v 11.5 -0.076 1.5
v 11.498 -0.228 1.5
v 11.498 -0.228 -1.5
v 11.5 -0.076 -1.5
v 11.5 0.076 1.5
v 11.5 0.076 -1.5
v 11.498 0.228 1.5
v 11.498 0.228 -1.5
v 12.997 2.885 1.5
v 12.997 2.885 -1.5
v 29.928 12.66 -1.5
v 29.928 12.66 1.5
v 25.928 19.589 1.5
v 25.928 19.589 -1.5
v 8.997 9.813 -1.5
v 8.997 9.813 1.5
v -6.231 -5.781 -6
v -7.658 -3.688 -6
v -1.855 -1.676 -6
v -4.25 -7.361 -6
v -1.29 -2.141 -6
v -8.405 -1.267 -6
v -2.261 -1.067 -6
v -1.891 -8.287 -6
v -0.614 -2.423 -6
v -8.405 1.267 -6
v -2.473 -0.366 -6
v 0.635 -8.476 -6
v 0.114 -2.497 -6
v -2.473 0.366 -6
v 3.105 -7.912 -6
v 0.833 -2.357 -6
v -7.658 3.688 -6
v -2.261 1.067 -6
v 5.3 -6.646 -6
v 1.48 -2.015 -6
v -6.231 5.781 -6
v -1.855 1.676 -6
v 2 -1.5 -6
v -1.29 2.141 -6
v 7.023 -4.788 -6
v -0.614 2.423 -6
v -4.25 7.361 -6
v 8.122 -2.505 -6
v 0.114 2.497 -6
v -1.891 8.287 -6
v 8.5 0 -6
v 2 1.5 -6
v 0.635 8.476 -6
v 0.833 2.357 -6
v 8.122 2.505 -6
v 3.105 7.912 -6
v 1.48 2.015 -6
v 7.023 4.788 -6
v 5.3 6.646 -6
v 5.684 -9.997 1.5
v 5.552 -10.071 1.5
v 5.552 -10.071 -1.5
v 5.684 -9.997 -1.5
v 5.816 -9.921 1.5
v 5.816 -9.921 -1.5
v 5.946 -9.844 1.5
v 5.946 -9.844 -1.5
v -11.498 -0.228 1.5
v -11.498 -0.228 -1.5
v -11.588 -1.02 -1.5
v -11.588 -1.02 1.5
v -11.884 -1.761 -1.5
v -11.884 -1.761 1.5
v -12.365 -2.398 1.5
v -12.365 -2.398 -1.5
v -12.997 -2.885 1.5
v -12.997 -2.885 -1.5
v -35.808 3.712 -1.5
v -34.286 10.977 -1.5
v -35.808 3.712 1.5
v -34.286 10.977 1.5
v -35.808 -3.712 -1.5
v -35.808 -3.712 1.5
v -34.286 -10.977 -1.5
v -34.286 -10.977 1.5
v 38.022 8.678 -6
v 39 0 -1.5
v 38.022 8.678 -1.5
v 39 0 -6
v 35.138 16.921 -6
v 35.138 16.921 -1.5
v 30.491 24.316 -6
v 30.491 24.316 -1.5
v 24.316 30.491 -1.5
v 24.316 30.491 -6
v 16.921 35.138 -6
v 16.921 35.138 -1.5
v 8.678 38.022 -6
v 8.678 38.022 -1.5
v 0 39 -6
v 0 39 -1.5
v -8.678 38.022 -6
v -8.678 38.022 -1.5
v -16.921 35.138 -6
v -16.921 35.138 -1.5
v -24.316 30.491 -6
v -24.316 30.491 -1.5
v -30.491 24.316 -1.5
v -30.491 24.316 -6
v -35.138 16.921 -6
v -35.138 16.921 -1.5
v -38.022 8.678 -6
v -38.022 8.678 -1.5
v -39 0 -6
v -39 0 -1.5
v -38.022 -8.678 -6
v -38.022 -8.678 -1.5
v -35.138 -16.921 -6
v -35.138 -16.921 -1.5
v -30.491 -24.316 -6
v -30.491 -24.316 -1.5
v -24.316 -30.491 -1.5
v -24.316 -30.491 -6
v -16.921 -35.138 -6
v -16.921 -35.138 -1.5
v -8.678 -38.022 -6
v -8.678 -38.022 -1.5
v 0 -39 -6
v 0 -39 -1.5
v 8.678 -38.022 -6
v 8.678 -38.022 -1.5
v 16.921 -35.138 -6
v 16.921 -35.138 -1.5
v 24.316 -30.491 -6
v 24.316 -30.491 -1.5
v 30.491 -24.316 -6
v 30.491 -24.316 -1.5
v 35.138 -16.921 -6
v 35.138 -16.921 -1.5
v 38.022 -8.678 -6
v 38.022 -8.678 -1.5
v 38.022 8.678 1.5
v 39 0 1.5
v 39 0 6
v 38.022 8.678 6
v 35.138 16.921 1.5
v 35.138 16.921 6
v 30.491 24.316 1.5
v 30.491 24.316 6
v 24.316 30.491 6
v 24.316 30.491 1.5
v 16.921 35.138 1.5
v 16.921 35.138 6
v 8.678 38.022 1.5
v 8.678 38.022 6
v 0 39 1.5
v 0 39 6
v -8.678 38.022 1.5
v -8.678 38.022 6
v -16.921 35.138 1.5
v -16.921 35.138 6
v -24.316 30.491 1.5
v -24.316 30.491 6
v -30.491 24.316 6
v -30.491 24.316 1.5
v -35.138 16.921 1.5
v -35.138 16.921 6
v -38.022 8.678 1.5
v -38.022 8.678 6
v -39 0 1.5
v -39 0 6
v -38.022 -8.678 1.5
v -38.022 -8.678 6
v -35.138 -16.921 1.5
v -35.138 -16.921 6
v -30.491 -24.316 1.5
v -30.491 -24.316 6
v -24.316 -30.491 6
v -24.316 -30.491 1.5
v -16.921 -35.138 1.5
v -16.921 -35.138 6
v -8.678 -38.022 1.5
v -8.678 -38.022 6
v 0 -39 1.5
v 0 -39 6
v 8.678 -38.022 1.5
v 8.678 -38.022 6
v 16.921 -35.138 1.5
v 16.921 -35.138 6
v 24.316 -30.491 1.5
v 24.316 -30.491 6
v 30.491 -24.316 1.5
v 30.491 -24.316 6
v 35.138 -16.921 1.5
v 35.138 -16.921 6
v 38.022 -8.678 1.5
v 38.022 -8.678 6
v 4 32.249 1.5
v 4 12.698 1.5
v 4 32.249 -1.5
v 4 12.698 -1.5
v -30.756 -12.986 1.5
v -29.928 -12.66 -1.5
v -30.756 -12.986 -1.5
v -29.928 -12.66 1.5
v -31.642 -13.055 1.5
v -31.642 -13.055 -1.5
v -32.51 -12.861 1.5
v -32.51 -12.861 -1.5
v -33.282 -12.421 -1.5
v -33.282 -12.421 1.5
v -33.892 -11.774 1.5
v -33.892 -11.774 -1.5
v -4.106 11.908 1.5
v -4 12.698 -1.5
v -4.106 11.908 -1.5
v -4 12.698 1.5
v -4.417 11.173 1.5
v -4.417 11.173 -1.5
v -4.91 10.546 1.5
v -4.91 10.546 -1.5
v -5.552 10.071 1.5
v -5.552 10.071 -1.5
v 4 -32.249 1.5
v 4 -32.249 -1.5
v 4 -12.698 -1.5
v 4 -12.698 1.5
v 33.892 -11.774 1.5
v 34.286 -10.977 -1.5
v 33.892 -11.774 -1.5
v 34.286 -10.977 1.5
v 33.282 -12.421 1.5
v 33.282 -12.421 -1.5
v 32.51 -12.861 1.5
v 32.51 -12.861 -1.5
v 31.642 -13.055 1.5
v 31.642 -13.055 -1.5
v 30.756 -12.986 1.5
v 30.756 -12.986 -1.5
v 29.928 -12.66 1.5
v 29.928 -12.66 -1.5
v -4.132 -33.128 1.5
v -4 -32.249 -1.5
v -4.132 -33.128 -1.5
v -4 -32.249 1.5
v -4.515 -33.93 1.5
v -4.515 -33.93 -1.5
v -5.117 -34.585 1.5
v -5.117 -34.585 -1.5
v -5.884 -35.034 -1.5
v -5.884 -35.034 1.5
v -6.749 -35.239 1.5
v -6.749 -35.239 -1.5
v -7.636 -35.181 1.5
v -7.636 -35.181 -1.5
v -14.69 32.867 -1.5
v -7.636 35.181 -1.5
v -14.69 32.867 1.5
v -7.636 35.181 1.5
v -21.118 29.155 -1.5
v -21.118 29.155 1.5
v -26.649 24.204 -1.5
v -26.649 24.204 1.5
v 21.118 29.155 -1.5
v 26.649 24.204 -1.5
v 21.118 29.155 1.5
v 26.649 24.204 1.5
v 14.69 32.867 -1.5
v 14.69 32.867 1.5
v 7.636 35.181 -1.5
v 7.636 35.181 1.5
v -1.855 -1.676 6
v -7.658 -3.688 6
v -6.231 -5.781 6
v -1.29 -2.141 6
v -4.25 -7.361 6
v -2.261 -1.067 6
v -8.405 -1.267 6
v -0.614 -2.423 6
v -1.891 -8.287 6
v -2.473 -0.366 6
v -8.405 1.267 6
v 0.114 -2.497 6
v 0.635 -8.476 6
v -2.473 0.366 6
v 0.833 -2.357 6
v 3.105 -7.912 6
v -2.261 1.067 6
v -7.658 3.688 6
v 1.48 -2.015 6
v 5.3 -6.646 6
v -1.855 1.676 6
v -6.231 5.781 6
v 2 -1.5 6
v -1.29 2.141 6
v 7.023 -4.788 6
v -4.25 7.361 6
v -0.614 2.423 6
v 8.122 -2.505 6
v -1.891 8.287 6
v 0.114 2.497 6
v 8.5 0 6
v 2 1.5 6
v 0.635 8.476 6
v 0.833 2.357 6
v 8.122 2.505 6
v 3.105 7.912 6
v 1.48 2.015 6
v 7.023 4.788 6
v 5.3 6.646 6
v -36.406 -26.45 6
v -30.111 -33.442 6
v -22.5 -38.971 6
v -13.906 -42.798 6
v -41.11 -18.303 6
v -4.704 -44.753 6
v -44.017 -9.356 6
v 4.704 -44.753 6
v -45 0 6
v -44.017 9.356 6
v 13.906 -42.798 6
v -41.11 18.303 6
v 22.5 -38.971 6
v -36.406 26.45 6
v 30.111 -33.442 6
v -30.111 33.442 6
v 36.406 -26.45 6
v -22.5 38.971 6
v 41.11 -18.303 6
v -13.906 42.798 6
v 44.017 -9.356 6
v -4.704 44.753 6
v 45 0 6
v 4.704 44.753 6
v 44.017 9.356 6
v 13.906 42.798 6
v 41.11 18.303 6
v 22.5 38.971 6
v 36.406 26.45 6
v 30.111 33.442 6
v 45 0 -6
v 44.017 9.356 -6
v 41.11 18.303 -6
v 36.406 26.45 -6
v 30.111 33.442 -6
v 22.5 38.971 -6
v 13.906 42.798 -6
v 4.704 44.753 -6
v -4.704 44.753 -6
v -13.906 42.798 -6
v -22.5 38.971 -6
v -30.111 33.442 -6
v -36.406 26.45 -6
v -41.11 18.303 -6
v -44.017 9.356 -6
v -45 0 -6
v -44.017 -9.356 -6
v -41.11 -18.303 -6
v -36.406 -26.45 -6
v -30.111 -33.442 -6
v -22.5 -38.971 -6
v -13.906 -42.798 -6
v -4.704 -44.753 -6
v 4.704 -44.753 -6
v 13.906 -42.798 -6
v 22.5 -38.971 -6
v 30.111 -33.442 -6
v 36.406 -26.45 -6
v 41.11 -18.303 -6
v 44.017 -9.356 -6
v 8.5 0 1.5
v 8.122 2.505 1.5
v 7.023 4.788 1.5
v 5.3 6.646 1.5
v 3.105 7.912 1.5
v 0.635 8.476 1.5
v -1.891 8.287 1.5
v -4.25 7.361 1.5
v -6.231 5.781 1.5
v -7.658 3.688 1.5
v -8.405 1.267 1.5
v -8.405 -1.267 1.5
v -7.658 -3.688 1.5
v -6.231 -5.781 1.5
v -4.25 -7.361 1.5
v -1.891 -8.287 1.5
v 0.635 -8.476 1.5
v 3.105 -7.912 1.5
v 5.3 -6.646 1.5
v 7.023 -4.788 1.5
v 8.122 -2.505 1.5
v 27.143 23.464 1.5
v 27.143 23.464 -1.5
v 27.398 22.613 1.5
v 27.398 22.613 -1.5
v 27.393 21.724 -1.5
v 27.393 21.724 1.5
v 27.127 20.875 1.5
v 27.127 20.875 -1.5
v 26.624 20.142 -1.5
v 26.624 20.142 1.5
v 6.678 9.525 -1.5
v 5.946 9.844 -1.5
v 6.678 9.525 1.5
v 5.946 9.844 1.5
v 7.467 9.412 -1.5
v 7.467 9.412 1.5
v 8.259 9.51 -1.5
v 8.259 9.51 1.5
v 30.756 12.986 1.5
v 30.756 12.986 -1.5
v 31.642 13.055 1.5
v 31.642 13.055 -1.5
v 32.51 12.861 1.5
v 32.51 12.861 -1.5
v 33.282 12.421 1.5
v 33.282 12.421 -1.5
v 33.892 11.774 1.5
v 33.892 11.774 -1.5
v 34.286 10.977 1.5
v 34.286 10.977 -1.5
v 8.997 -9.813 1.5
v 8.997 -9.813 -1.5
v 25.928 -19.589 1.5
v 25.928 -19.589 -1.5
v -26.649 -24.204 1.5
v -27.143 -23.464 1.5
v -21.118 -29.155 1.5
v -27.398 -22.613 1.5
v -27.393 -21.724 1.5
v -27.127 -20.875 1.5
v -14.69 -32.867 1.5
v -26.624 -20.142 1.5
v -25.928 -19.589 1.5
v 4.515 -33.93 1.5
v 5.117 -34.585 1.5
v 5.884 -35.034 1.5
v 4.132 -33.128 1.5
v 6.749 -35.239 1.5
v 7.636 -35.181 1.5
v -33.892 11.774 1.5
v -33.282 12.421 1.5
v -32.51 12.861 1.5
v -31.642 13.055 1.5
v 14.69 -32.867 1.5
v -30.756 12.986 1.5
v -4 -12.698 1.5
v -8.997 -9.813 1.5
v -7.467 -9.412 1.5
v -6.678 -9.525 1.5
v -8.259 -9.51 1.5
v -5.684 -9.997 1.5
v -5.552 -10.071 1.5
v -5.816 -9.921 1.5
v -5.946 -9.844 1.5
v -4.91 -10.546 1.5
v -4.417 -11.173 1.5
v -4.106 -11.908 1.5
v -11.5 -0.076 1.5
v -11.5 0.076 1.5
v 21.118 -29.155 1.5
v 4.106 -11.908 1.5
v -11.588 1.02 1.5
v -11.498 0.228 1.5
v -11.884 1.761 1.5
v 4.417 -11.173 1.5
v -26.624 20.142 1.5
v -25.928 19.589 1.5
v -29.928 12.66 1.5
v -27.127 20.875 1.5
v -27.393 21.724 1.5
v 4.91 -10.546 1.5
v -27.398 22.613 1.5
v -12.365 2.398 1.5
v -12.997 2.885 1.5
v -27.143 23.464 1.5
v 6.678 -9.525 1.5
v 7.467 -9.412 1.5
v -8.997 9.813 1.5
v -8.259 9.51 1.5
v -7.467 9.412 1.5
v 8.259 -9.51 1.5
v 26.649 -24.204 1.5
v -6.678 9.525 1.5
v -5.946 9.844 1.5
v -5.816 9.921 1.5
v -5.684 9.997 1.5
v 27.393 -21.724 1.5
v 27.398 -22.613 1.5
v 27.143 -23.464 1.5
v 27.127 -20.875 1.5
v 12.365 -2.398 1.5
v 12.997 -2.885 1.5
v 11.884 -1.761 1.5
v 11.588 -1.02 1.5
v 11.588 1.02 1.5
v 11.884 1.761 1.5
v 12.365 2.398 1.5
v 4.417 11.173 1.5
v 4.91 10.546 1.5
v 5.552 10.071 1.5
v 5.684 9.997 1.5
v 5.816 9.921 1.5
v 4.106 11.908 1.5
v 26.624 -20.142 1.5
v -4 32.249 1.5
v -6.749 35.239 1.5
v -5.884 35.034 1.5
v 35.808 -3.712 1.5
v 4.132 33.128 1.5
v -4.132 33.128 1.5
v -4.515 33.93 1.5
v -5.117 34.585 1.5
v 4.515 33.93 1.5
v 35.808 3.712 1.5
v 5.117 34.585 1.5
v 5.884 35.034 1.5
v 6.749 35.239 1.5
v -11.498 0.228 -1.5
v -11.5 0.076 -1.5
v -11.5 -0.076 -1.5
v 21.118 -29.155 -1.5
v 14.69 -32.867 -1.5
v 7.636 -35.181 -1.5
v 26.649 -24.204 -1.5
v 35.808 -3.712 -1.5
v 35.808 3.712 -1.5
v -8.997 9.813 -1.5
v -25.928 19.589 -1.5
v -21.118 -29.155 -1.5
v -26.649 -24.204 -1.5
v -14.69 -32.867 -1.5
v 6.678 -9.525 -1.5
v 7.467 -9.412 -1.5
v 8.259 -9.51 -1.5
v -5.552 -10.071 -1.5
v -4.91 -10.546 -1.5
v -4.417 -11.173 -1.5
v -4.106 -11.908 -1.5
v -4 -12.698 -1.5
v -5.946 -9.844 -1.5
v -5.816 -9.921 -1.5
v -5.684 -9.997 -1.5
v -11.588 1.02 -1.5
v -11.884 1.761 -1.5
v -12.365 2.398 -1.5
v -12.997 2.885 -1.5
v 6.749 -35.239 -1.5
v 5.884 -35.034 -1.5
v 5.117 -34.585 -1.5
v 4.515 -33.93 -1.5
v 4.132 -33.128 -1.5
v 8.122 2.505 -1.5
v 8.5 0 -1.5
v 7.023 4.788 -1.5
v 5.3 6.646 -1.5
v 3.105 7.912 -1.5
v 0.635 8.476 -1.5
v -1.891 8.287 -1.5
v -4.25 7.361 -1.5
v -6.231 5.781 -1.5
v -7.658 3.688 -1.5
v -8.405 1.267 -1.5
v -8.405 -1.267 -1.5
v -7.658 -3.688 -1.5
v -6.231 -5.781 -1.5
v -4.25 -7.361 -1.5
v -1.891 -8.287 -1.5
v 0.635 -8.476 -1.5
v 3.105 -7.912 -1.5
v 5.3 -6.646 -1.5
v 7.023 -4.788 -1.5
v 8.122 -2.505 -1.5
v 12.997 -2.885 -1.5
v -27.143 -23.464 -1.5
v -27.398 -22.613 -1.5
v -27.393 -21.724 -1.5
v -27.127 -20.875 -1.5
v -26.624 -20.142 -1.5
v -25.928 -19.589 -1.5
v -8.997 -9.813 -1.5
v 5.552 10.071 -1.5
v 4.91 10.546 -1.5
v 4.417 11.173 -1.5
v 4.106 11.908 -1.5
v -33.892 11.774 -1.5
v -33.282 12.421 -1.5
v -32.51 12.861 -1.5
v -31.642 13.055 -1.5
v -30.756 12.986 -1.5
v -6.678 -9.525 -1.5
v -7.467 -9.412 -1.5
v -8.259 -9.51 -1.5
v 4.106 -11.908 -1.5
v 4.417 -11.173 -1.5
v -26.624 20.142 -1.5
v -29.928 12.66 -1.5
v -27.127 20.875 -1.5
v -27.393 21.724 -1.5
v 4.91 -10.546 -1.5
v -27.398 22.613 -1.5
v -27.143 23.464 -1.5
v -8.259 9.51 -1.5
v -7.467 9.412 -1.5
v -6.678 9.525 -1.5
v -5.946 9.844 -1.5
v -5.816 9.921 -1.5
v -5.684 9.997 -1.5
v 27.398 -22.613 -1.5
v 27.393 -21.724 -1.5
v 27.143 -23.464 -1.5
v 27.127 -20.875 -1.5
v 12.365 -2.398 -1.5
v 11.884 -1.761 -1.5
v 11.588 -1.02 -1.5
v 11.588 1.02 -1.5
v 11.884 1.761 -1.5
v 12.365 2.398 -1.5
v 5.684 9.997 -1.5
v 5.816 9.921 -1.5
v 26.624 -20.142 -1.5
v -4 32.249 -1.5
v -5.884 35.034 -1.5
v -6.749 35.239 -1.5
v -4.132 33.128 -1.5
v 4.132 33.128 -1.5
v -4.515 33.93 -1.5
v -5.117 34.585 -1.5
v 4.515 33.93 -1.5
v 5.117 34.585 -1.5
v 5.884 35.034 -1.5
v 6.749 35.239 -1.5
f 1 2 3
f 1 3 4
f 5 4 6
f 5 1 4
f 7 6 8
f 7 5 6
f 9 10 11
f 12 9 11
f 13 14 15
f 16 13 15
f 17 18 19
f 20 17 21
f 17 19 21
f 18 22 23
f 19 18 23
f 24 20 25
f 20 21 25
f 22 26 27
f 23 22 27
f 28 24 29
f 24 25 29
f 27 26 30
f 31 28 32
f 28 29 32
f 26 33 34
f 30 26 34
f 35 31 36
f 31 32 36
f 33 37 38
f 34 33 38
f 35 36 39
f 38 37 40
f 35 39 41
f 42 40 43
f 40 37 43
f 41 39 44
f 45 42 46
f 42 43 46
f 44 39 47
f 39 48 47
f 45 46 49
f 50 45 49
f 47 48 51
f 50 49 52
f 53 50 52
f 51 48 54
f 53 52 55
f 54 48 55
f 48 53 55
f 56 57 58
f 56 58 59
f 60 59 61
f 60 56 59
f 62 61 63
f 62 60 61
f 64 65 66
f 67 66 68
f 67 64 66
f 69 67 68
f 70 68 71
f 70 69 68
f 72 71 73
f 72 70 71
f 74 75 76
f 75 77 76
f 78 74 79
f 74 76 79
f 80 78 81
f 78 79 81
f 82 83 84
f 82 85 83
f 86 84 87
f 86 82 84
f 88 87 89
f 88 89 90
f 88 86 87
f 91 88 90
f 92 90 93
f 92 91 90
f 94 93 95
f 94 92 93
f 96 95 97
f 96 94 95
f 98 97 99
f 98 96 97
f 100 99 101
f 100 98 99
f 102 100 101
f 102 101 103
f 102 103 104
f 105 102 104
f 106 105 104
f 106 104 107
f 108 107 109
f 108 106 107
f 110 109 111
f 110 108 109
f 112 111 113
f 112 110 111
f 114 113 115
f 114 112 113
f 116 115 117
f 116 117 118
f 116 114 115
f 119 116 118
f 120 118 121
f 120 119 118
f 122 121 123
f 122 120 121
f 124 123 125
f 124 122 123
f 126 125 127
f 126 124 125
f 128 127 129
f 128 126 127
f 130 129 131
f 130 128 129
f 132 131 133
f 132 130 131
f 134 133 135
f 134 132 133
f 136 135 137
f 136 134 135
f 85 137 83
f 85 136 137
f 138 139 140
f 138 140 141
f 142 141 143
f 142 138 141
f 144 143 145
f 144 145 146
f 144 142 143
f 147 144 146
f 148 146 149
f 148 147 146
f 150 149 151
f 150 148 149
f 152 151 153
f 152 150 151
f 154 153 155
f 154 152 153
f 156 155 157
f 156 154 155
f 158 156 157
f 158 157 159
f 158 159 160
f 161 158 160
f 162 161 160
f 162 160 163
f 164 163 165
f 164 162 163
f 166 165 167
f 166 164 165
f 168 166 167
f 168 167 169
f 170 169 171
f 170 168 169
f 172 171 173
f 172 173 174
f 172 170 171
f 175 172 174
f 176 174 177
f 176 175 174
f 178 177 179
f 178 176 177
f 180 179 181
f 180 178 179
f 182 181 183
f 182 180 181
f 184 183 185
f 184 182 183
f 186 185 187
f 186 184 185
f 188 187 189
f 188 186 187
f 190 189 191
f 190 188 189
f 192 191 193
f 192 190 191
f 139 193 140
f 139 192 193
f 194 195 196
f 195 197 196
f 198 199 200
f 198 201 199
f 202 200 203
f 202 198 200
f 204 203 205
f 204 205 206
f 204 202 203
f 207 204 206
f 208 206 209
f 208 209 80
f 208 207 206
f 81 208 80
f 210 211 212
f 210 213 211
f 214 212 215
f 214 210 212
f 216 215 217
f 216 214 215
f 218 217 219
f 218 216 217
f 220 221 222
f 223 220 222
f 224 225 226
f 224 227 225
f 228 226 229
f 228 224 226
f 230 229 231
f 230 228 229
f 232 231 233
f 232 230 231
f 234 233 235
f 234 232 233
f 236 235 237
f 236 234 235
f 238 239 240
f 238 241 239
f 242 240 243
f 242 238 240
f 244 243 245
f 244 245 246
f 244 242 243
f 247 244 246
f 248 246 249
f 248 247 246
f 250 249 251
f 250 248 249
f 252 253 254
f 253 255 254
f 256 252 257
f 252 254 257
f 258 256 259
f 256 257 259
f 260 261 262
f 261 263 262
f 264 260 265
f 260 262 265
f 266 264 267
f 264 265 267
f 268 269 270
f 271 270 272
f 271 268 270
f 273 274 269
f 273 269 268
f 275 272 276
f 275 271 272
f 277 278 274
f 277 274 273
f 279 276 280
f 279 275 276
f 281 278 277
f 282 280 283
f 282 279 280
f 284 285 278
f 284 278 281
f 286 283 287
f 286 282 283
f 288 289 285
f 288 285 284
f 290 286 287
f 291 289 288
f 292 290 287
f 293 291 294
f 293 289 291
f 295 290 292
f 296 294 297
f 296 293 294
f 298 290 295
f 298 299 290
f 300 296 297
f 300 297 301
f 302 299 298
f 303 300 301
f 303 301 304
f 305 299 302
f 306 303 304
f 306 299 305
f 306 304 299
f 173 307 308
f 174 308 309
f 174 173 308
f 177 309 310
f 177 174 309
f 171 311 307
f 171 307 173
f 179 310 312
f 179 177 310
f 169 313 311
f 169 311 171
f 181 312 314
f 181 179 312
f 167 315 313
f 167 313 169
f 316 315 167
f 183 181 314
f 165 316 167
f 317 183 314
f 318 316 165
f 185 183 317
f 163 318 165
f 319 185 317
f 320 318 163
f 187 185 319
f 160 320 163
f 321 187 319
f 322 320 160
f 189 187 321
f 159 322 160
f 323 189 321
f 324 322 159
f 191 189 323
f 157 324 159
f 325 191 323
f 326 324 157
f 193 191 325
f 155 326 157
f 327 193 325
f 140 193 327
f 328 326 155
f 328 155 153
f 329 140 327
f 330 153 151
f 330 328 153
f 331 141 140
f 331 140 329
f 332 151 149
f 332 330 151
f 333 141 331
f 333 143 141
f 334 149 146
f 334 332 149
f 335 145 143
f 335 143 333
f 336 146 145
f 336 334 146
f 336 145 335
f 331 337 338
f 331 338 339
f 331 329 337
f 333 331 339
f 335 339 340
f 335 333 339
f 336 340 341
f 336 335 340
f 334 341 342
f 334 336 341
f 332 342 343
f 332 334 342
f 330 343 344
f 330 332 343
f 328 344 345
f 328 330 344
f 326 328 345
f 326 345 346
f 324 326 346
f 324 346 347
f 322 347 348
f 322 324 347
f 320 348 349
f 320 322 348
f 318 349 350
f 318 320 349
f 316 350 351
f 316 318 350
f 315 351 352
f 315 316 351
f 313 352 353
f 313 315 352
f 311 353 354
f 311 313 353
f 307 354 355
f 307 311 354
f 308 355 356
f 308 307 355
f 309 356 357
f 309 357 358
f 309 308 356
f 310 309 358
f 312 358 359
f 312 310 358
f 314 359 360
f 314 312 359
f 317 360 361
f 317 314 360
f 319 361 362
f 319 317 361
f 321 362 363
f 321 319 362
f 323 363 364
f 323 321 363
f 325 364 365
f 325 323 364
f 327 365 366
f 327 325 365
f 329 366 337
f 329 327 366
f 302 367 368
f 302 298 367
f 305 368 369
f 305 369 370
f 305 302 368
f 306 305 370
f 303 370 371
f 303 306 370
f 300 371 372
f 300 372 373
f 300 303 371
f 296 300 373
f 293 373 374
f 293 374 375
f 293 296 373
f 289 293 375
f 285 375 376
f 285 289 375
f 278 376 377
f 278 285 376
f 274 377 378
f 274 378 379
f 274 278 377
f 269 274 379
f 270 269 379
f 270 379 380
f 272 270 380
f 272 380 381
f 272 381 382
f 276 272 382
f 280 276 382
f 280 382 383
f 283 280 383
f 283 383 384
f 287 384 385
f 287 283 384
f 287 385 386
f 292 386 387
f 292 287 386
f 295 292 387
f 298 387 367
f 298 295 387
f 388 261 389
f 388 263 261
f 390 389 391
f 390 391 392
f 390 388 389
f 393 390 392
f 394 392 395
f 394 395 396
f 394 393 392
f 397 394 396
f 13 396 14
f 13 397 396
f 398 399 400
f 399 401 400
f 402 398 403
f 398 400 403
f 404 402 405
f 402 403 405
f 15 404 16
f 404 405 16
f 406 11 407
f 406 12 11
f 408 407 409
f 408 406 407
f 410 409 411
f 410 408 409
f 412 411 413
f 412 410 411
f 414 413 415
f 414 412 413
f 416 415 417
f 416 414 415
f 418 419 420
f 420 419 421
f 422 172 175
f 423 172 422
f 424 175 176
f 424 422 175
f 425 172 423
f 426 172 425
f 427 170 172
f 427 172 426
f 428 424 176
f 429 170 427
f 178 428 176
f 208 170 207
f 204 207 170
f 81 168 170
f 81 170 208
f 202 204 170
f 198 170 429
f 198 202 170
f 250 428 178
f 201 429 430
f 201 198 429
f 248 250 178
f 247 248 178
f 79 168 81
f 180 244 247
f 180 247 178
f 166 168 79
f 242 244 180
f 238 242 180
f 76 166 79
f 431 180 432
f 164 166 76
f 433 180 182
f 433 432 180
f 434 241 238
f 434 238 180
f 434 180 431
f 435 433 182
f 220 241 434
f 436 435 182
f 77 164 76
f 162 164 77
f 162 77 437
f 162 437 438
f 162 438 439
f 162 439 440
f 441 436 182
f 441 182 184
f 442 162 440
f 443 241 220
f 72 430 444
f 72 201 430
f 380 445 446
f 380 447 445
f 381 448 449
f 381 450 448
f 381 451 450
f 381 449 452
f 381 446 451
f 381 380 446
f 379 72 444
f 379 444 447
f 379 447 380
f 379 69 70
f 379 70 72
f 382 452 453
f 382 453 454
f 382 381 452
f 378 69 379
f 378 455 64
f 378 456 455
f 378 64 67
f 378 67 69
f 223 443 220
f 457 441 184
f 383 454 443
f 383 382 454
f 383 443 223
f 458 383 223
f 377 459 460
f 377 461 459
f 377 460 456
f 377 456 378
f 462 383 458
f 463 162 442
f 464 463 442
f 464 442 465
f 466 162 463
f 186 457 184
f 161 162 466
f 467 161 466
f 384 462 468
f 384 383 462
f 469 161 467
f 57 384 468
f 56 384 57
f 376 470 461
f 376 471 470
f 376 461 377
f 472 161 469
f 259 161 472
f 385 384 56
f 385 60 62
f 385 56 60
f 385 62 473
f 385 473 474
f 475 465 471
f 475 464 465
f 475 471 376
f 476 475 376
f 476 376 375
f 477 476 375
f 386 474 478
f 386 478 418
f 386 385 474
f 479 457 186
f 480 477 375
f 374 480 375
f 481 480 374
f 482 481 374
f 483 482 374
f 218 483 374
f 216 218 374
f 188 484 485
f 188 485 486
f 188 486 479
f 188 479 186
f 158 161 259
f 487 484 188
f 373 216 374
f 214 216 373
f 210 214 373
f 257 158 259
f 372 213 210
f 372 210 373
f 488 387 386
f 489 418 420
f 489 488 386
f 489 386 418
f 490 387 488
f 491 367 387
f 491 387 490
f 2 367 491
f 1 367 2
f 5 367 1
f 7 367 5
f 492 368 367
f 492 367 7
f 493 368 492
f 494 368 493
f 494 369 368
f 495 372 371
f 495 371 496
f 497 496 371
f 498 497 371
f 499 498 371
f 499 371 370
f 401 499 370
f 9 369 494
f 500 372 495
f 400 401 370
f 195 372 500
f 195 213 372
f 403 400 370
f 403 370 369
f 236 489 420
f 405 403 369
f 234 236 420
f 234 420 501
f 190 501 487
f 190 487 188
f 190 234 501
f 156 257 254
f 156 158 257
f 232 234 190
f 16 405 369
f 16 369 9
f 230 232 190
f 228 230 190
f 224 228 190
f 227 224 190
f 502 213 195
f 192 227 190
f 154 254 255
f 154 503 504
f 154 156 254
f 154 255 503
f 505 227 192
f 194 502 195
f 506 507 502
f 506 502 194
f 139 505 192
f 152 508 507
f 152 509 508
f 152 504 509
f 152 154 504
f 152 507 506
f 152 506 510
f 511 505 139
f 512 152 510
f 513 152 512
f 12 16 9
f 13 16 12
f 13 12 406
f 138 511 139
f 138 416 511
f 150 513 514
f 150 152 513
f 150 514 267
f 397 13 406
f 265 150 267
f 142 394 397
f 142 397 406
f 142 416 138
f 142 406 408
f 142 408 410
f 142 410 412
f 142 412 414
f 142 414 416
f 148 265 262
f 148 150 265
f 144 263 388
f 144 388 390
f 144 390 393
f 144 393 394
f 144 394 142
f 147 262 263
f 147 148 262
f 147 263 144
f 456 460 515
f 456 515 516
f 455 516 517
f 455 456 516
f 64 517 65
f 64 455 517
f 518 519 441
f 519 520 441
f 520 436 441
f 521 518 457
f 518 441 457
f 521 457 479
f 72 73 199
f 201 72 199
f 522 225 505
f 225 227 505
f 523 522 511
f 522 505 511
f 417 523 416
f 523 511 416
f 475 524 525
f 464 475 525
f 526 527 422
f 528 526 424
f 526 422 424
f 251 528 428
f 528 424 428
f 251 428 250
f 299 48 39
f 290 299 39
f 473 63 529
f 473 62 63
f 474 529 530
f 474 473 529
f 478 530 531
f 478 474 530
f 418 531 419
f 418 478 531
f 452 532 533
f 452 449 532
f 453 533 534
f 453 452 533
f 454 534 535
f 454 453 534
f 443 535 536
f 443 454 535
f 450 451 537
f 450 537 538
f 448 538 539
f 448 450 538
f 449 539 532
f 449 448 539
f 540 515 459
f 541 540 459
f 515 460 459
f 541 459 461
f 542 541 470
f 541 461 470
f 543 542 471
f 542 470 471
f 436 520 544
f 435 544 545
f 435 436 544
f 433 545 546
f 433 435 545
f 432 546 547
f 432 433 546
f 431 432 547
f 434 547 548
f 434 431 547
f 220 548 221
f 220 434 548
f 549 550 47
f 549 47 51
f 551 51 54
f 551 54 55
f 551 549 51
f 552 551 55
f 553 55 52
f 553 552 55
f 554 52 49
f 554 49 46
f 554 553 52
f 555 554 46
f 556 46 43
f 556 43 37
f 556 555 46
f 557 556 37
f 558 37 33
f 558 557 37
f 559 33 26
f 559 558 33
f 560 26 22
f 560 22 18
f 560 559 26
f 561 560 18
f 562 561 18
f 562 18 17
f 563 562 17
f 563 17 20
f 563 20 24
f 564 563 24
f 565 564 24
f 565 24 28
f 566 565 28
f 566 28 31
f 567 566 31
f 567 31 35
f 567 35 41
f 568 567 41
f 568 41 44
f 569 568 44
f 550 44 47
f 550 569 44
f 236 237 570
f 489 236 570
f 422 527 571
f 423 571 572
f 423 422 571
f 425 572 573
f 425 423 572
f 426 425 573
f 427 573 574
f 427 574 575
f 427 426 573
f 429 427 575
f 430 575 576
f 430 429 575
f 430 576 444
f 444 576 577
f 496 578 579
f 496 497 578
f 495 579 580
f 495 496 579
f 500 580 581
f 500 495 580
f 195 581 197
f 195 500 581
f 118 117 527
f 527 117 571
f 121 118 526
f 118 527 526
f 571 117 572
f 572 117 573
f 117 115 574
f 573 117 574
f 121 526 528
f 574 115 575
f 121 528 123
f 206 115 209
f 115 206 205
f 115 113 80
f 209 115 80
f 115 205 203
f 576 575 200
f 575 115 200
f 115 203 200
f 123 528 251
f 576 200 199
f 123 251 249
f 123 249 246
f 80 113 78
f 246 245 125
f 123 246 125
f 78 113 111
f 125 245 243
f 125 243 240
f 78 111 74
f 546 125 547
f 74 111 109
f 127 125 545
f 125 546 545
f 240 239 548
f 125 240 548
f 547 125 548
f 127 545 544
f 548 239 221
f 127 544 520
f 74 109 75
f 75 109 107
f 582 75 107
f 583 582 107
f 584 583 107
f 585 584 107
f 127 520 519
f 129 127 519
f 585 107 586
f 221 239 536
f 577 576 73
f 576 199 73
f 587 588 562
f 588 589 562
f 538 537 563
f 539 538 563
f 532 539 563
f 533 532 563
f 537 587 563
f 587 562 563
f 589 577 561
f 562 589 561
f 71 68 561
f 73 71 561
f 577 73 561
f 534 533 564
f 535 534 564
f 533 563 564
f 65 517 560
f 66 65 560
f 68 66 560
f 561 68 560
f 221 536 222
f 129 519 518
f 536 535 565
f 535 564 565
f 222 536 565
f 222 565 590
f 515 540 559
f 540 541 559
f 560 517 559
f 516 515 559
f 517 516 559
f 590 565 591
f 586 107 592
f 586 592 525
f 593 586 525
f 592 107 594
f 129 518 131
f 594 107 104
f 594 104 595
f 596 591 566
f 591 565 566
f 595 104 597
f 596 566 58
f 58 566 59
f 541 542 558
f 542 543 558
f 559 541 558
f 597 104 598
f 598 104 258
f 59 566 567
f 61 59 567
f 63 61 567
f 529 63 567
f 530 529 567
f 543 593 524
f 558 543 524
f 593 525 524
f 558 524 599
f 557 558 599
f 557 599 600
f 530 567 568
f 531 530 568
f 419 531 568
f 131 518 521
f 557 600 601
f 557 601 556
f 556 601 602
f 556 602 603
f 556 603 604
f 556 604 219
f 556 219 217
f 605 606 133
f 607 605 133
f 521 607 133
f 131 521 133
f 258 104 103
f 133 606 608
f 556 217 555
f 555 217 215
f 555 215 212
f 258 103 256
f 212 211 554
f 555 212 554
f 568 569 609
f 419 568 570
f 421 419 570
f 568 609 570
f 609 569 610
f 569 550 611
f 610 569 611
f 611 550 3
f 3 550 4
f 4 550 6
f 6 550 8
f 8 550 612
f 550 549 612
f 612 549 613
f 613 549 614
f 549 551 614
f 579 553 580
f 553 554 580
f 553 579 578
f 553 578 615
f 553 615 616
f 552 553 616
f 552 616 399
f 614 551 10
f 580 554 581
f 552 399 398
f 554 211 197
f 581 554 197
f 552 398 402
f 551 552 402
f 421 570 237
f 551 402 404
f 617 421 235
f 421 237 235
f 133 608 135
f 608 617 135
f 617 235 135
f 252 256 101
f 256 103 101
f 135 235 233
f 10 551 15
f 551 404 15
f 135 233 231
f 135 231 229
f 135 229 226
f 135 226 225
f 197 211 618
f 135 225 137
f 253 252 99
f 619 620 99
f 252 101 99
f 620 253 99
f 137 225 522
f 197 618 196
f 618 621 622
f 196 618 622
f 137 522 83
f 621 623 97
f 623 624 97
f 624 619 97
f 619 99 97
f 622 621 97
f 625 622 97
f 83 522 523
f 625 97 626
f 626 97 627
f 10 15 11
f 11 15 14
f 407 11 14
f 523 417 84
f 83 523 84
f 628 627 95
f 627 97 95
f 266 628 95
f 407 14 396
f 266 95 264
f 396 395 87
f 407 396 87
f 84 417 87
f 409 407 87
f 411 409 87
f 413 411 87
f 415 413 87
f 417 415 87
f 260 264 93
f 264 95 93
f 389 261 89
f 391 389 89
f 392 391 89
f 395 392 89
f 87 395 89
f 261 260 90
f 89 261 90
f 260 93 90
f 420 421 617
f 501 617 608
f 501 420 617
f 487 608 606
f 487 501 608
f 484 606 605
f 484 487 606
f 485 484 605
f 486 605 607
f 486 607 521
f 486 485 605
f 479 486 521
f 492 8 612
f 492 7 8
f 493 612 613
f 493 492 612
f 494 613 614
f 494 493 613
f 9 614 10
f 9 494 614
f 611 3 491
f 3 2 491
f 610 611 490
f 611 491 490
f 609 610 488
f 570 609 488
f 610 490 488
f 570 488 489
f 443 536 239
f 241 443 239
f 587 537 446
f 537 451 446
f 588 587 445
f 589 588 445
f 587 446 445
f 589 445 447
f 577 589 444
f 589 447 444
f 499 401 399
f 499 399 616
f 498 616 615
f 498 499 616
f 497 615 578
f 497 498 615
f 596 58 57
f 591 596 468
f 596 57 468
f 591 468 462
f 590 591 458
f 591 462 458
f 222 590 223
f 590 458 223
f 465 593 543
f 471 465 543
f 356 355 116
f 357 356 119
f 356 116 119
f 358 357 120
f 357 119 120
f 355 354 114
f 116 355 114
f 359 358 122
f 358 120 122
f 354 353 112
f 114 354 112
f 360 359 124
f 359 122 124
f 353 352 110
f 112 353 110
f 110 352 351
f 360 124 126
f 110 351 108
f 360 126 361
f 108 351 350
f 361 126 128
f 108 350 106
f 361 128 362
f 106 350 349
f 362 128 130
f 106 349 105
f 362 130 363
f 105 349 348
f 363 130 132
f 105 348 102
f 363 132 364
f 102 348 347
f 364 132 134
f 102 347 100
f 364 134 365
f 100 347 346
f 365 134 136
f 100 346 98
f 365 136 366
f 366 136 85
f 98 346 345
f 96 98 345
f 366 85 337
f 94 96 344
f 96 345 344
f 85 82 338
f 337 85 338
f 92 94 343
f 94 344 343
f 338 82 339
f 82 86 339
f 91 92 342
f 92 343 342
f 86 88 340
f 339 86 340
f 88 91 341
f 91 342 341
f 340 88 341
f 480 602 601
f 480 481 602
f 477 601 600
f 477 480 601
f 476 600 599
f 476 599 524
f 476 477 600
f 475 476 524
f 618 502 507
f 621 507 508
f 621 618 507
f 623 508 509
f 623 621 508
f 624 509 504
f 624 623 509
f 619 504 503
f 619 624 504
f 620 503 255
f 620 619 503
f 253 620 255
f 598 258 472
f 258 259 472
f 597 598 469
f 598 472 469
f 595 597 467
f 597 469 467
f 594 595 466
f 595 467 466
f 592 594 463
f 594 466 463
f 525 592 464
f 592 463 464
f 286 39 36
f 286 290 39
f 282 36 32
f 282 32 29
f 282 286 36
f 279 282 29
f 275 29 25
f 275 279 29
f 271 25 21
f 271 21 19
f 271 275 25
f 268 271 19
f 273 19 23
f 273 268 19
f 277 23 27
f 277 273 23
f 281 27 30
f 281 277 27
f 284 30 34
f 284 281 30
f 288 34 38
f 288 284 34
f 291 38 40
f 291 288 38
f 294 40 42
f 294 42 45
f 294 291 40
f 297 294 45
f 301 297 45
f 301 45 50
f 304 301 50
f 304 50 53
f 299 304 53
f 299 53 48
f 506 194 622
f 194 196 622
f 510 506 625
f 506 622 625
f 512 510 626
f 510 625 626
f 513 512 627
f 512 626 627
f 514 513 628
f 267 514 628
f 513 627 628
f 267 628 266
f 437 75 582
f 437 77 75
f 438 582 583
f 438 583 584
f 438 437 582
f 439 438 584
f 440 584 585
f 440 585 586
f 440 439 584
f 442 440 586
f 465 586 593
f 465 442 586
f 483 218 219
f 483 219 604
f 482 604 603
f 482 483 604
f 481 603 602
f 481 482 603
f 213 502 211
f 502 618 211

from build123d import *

# Parameters (mm, degrees)
SKETCH1_R             = 45
SKETCH1_R_2           = 39
BOSS_EXTRUDE1_DEPTH   = 6
SKETCH1_R_3           = 8.5
BOSS_EXTRUDE1_2_DEPTH = 6
SKETCH4_R             = 39
SKETCH4_R_2           = 36
SKETCH4_R_3           = 11.5
SKETCH4_R_4           = 8.5
BOSS_EXTRUDE3_DEPTH   = 1.5
BOSS_EXTRUDE2_START   = -1.5
BOSS_EXTRUDE2_DEPTH   = 3
CIRPATTERN6_COUNT     = 6
FILLET1_R             = 3


# Read off the part's stored shape, not the designer's step: Boss-Extrude2
with BuildPart() as part:
    # Sketch1 → Boss-Extrude1 (new, symmetric)
    with BuildSketch(Plane.XY):
        Circle(SKETCH1_R)
        Circle(SKETCH1_R_2, mode=Mode.SUBTRACT)
    extrude(amount=BOSS_EXTRUDE1_DEPTH, both=True)



with BuildPart() as body_2:
    # Sketch1 → Boss-Extrude1 2 (new, symmetric)
    with BuildSketch(Plane.XY):
        Circle(SKETCH1_R_3)
        with BuildLine():
            Line((2, 1.5), (2, -1.5))
            ThreePointArc((2, -1.5), (-2.5, 0), (2, 1.5))
        make_face(mode=Mode.SUBTRACT)
    extrude(amount=BOSS_EXTRUDE1_2_DEPTH, both=True)


with BuildPart() as part_1:
    add(part.part)

    add(body_2.part)  # Boss-Extrude3 merges body 2
    # Sketch4 → Boss-Extrude3 (add, symmetric)
    # profile 1 of 2: a face of its own
    with BuildSketch(Plane.XY):
        Circle(SKETCH4_R)
        Circle(SKETCH4_R_2, mode=Mode.SUBTRACT)
    # profile 2 of 2: a face of its own
    with BuildSketch(Plane.XY):
        Circle(SKETCH4_R_3)
        Circle(SKETCH4_R_4, mode=Mode.SUBTRACT)
    extrude(amount=BOSS_EXTRUDE3_DEPTH, both=True)


with BuildPart() as body_2_2:
    # Boss-Extrude2 outline → Boss-Extrude2 (new body)
    with BuildSketch(Plane.XY.offset(BOSS_EXTRUDE2_START)):
        with BuildLine():
            Line((-4, 35.77708764), (-4, 10.781929326))
            ThreePointArc((-4, 10.781929326), (0, 11.5), (4, 10.781929326))
            Line((4, 10.781929326), (4, 35.77708764))
            ThreePointArc((4, 35.77708764), (0, 36), (-4, 35.77708764))
        make_face()
    extrude(amount=BOSS_EXTRUDE2_DEPTH)


with BuildPart() as cirpattern6_1:
    # CirPattern6: pattern copy
    add(body_2_2.part.rotate(Axis((0, 0, 0), (0, 0, 1)), 1 * 360 / CIRPATTERN6_COUNT))


with BuildPart() as cirpattern6_2:
    # CirPattern6: pattern copy
    add(body_2_2.part.rotate(Axis((0, 0, 0), (0, 0, 1)), 2 * 360 / CIRPATTERN6_COUNT))


with BuildPart() as cirpattern6_3:
    # CirPattern6: pattern copy
    add(body_2_2.part.rotate(Axis((0, 0, 0), (0, 0, 1)), 3 * 360 / CIRPATTERN6_COUNT))


with BuildPart() as cirpattern6_4:
    # CirPattern6: pattern copy
    add(body_2_2.part.rotate(Axis((0, 0, 0), (0, 0, 1)), 4 * 360 / CIRPATTERN6_COUNT))


with BuildPart() as cirpattern6_5:
    # CirPattern6: pattern copy
    add(body_2_2.part.rotate(Axis((0, 0, 0), (0, 0, 1)), 5 * 360 / CIRPATTERN6_COUNT))


with BuildPart() as part_2:
    add(part_1.part)

    # Combine1: union body 2 2, CirPattern6_5, CirPattern6_4, CirPattern6_3, CirPattern6_2, CirPattern6_1
    add(body_2_2.part)
    add(cirpattern6_5.part)
    add(cirpattern6_4.part)
    add(cirpattern6_3.part)
    add(cirpattern6_2.part)
    add(cirpattern6_1.part)

    # Fillet1
    fillet1_edges = [part_2.edges().sort_by_distance(p)[0] for p in [
        (-4, 10.781929326, 0),
        (-11.337424698, 1.926863048, 0),
        (-7.337424698, -8.855066278, 0),
        (4, -10.781929326, 0),
        (11.337424698, -1.926863048, 0),
        (7.337424698, 8.855066278, 0),
        (-4, 35.77708764, 0),
        (4, 10.781929326, 0),
        (4, 35.77708764, 0),
        (28.98386677, 21.352645435, 0),
        (11.337424698, 1.926863048, 0),
        (32.98386677, 14.424442205, 0),
        (32.98386677, -14.424442205, 0),
        (7.337424698, -8.855066278, 0),
        (28.98386677, -21.352645435, 0),
        (4, -35.77708764, 0),
        (-4, -10.781929326, 0),
        (-4, -35.77708764, 0),
        (-28.98386677, -21.352645435, 0),
        (-11.337424698, -1.926863048, 0),
        (-32.98386677, -14.424442205, 0),
        (-32.98386677, 14.424442205, 0),
        (-7.337424698, 8.855066278, 0),
        (-28.98386677, 21.352645435, 0),
    ]]
    fillet(fillet1_edges, radius=FILLET1_R)


solid = part_2.part
